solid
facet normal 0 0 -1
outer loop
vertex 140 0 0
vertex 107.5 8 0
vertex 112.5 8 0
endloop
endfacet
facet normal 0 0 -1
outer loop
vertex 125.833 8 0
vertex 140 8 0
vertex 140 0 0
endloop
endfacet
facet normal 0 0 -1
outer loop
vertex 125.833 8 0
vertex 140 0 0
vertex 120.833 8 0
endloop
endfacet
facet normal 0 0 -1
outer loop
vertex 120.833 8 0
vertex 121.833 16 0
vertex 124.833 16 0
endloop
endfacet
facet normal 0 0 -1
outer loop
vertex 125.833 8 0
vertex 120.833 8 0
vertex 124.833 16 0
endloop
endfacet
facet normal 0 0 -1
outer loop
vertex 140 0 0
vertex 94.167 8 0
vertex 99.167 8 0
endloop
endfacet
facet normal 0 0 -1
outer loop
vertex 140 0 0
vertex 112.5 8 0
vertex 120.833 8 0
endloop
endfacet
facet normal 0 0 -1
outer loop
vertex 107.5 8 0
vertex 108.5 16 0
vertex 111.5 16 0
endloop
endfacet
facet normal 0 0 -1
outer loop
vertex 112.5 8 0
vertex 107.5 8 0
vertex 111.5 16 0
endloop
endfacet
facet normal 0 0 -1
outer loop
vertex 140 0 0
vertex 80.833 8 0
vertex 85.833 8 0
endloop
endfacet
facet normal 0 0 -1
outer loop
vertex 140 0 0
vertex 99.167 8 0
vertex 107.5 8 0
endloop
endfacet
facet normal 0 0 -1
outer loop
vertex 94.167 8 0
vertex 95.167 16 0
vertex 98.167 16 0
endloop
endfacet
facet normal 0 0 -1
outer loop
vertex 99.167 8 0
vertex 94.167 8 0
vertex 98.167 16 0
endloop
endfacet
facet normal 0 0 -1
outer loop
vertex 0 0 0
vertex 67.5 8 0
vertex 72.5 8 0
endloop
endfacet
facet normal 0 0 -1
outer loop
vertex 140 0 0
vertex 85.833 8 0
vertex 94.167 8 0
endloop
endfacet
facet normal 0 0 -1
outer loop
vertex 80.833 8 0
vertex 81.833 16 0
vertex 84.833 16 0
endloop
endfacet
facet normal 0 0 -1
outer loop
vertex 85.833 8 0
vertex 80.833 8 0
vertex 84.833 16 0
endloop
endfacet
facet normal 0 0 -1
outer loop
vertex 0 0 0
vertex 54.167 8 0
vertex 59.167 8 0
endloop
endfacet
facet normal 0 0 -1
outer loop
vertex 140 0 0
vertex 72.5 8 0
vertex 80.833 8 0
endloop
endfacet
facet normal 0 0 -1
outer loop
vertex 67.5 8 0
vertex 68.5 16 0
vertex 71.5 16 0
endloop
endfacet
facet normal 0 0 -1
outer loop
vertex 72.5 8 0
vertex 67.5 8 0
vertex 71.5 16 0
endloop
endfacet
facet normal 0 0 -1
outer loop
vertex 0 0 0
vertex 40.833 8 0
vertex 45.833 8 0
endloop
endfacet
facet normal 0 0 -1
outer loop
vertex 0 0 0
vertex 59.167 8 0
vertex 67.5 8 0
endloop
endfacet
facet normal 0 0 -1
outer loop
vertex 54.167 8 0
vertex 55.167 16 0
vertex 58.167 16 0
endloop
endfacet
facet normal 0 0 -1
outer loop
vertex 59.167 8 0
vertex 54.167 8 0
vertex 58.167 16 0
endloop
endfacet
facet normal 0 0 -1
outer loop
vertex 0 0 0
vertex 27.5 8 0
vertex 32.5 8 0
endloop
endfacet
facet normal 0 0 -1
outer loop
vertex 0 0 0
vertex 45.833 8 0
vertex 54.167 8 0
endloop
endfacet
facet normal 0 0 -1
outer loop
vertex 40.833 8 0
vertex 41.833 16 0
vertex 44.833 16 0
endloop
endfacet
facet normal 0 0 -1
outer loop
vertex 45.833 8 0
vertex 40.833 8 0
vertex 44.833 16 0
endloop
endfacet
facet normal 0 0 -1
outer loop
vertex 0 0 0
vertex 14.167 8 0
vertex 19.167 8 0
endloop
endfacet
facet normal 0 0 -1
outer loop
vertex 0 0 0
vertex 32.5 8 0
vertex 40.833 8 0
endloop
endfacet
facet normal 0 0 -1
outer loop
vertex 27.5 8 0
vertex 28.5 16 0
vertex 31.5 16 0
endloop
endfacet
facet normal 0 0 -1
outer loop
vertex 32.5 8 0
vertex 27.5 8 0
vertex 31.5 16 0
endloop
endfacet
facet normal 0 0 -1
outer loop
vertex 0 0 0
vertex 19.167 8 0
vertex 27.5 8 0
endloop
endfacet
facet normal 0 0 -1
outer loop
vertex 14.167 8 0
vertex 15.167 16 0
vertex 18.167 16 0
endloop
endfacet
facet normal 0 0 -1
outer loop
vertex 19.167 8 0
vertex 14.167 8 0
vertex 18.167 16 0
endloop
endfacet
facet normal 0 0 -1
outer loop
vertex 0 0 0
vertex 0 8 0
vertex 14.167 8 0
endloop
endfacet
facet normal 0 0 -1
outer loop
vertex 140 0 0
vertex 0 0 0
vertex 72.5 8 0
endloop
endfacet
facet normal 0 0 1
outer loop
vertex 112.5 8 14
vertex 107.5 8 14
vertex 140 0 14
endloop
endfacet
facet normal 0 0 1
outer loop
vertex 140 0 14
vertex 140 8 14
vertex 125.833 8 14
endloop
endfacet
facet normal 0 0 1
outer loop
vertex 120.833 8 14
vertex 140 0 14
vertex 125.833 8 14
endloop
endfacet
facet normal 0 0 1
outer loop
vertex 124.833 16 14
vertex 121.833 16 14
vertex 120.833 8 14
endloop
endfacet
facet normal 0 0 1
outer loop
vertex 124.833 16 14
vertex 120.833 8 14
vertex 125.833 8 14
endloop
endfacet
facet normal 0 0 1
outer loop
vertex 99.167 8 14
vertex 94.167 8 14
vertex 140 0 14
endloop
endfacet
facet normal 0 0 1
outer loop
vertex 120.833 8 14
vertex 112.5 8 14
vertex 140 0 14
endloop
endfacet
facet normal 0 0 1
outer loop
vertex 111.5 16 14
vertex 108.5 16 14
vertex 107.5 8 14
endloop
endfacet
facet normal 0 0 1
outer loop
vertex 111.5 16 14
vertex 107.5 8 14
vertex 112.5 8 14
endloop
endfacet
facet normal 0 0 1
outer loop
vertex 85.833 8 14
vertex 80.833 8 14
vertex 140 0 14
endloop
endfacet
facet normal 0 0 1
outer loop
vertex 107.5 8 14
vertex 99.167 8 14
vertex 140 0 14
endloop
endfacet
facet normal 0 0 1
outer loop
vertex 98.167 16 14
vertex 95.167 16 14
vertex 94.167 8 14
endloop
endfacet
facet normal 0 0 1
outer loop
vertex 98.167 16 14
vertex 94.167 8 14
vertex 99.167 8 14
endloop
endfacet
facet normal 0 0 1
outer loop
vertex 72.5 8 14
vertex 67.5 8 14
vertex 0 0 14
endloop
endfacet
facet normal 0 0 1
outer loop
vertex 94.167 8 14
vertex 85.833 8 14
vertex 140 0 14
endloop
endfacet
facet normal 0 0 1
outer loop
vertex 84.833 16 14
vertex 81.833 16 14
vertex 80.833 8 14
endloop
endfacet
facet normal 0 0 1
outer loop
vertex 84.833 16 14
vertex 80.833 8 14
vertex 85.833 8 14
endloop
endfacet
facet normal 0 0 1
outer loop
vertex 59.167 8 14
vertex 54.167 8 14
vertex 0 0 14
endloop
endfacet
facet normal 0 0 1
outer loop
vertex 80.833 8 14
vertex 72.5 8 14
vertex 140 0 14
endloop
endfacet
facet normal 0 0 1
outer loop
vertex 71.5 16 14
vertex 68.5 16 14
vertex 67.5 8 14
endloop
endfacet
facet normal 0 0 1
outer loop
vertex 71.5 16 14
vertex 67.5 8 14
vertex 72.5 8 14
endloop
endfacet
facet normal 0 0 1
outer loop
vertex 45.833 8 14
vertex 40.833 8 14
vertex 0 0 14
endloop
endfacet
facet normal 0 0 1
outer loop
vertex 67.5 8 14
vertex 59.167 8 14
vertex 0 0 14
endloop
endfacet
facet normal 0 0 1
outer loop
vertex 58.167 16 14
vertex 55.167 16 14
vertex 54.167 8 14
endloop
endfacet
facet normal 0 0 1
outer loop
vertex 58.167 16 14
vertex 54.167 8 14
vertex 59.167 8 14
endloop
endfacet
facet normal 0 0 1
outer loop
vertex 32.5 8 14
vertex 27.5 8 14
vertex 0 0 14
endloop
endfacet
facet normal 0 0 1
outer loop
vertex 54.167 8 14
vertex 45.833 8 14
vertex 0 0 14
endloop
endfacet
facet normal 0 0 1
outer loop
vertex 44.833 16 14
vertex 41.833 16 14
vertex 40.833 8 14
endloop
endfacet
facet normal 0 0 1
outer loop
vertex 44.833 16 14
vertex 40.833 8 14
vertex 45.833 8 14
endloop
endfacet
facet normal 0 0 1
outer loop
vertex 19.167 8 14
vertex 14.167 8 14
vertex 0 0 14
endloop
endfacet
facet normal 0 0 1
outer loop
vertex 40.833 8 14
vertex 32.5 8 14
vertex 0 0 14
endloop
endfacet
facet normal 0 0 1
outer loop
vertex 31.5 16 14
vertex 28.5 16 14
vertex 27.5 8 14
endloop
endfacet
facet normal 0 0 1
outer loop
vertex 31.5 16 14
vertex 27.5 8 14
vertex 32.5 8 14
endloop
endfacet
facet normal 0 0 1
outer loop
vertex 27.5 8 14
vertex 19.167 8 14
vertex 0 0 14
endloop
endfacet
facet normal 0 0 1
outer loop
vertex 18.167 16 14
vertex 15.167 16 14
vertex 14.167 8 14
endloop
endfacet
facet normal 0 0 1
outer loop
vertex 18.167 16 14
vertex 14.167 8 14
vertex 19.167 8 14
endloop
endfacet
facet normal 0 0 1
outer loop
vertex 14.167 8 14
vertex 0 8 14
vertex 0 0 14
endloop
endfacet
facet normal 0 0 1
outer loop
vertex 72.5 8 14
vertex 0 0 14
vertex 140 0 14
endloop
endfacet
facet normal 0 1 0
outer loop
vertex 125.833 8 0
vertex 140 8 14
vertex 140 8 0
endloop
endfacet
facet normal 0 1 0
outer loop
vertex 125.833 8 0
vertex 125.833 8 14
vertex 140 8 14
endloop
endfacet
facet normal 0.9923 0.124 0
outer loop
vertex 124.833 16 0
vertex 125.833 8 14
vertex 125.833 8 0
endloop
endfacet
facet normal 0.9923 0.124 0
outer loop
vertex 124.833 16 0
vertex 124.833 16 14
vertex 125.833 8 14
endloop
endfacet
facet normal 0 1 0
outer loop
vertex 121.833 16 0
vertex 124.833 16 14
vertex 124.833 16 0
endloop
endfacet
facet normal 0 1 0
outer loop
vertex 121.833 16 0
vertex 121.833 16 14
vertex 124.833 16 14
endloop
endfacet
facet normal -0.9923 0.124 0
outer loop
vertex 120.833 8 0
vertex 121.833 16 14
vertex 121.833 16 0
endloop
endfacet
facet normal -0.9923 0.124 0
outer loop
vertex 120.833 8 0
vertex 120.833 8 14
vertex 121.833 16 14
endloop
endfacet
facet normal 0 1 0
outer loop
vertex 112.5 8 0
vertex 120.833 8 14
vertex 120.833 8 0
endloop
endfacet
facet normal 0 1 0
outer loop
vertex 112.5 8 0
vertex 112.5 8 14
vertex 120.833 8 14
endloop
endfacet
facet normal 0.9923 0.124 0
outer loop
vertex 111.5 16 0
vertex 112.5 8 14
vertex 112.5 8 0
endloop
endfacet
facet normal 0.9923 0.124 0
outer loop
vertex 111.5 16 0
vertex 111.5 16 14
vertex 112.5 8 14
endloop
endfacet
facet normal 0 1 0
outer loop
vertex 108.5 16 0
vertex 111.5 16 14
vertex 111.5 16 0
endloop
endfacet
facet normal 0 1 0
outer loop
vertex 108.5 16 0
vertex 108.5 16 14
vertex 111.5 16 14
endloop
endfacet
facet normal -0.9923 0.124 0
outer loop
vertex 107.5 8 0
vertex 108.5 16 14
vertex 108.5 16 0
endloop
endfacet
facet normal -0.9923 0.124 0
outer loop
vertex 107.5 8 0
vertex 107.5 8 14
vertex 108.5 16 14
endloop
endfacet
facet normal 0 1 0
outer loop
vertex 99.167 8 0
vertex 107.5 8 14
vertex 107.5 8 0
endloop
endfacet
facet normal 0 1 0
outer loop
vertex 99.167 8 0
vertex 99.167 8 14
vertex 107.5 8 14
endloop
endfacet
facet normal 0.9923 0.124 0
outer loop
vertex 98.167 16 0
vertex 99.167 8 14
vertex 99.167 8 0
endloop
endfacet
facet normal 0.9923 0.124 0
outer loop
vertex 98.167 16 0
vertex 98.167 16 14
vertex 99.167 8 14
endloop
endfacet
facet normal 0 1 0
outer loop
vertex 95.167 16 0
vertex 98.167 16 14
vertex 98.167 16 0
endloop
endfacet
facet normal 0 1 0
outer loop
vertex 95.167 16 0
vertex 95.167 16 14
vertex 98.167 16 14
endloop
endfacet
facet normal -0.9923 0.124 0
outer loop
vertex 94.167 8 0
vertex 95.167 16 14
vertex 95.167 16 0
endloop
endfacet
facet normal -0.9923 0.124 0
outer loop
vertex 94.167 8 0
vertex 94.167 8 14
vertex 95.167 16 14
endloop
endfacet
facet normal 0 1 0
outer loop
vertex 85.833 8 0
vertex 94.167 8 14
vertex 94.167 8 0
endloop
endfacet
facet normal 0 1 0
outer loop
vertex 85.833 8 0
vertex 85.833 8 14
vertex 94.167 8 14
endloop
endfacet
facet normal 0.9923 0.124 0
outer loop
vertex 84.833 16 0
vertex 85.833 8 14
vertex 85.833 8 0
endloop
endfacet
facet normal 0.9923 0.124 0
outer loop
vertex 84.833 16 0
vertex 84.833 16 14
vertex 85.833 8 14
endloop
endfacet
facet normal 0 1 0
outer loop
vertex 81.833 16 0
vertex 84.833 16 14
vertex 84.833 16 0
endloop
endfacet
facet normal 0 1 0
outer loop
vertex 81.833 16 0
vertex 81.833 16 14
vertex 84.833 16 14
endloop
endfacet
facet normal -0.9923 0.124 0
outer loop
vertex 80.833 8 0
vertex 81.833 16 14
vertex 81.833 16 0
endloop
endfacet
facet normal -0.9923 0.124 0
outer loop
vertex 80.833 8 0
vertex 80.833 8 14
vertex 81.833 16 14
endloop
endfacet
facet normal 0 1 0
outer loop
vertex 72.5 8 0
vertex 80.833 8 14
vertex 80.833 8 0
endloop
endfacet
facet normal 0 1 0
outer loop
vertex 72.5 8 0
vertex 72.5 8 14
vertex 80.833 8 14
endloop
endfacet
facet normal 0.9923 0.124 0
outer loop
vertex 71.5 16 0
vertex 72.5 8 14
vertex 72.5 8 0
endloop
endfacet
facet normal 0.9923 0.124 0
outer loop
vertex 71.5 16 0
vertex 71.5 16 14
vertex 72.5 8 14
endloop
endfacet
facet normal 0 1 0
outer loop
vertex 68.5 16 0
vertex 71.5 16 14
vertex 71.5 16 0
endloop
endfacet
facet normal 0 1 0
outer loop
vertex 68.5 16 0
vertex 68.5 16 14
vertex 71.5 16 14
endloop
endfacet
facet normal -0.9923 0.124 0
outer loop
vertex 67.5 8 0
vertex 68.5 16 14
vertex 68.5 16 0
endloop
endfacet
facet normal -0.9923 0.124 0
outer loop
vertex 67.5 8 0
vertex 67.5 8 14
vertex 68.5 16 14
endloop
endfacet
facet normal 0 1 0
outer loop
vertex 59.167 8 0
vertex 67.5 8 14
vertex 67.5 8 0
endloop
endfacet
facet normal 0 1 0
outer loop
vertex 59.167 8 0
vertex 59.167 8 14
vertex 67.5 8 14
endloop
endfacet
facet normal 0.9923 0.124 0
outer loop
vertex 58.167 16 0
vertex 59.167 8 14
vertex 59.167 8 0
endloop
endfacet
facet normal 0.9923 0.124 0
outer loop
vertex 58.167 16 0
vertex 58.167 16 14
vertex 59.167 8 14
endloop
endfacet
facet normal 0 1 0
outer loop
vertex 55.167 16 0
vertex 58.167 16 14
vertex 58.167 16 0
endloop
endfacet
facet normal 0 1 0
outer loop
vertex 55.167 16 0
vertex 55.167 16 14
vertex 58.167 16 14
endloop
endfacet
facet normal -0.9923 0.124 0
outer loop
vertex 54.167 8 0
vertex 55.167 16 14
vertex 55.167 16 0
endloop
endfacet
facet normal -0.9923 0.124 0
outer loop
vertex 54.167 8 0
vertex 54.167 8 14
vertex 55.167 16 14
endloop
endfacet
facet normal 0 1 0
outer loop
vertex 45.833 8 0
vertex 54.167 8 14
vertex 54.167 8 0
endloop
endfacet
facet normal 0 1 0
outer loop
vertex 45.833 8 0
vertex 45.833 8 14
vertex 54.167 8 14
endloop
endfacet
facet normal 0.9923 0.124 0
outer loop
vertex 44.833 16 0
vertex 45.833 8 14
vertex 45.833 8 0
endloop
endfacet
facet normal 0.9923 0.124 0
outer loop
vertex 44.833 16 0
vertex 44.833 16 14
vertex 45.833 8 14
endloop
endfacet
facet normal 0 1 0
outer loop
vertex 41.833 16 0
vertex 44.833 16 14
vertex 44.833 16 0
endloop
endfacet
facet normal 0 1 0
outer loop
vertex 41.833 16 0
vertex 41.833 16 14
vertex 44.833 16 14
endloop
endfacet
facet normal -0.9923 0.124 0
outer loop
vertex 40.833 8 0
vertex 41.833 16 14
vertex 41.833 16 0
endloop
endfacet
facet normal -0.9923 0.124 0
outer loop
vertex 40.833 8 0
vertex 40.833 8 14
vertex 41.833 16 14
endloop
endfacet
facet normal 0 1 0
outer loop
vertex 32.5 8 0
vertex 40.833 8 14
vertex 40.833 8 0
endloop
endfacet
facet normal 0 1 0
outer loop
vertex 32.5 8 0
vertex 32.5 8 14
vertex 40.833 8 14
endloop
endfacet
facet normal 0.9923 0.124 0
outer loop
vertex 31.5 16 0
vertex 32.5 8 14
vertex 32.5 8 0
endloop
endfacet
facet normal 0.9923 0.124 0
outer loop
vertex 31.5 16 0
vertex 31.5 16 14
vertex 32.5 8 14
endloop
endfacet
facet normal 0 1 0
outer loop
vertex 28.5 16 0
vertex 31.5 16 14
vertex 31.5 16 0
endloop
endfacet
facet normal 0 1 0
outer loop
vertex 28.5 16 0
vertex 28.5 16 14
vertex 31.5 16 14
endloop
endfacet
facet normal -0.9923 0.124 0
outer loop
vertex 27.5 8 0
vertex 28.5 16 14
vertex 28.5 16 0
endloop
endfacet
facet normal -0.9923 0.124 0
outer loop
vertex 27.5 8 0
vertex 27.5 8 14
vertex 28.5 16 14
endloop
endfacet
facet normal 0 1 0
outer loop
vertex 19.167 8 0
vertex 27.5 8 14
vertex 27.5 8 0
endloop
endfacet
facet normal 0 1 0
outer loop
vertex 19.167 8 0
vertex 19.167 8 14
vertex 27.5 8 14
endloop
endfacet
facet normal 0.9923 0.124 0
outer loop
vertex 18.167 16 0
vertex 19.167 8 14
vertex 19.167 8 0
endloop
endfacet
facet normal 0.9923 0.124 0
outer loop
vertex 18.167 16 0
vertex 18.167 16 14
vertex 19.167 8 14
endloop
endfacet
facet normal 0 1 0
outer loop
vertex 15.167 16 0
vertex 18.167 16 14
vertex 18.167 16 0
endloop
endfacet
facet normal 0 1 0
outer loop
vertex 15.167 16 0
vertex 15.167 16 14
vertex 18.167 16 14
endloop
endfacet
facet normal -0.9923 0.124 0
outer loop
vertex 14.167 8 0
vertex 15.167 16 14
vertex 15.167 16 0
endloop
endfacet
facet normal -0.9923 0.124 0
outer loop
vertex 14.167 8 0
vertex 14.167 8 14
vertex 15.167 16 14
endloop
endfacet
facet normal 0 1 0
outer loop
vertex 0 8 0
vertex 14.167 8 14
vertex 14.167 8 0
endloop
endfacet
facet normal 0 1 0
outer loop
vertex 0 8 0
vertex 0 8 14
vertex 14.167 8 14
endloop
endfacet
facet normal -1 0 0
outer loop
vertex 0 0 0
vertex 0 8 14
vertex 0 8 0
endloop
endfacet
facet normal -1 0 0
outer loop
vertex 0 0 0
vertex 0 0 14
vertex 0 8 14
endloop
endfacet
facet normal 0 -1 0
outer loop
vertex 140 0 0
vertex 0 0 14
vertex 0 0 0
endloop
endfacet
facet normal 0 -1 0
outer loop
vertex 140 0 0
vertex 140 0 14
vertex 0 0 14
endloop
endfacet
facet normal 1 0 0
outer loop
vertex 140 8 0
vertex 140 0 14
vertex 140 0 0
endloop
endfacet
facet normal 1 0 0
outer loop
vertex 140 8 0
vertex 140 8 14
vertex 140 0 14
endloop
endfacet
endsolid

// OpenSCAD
$fn = 32;

// ----------------------------------------------------------------------
// Gear rack: 9 teeth on a 140 mm bar, pitch 13.33 mm
// ----------------------------------------------------------------------

// --- parameters (mm) ---
profile_height = 14;      // extrusion height
profile_points = 40;      // points of the closed outline

profile = [[0, 0], [140, 0], [140, 8], [125.833, 8], [124.833, 16], [121.833, 16], [120.833, 8], [112.5, 8], [111.5, 16], [108.5, 16], [107.5, 8], [99.167, 8], [98.167, 16], [95.167, 16], [94.167, 8], [85.833, 8], [84.833, 16], [81.833, 16], [80.833, 8], [72.5, 8], [71.5, 16], [68.5, 16], [67.5, 8], [59.167, 8], [58.167, 16], [55.167, 16], [54.167, 8], [45.833, 8], [44.833, 16], [41.833, 16], [40.833, 8], [32.5, 8], [31.5, 16], [28.5, 16], [27.5, 8], [19.167, 8], [18.167, 16], [15.167, 16], [14.167, 8], [0, 8]];  // single closed polygon, 40 points, counter clockwise

// --- the one profile operation ---
linear_extrude(height = profile_height) polygon(points = profile);
